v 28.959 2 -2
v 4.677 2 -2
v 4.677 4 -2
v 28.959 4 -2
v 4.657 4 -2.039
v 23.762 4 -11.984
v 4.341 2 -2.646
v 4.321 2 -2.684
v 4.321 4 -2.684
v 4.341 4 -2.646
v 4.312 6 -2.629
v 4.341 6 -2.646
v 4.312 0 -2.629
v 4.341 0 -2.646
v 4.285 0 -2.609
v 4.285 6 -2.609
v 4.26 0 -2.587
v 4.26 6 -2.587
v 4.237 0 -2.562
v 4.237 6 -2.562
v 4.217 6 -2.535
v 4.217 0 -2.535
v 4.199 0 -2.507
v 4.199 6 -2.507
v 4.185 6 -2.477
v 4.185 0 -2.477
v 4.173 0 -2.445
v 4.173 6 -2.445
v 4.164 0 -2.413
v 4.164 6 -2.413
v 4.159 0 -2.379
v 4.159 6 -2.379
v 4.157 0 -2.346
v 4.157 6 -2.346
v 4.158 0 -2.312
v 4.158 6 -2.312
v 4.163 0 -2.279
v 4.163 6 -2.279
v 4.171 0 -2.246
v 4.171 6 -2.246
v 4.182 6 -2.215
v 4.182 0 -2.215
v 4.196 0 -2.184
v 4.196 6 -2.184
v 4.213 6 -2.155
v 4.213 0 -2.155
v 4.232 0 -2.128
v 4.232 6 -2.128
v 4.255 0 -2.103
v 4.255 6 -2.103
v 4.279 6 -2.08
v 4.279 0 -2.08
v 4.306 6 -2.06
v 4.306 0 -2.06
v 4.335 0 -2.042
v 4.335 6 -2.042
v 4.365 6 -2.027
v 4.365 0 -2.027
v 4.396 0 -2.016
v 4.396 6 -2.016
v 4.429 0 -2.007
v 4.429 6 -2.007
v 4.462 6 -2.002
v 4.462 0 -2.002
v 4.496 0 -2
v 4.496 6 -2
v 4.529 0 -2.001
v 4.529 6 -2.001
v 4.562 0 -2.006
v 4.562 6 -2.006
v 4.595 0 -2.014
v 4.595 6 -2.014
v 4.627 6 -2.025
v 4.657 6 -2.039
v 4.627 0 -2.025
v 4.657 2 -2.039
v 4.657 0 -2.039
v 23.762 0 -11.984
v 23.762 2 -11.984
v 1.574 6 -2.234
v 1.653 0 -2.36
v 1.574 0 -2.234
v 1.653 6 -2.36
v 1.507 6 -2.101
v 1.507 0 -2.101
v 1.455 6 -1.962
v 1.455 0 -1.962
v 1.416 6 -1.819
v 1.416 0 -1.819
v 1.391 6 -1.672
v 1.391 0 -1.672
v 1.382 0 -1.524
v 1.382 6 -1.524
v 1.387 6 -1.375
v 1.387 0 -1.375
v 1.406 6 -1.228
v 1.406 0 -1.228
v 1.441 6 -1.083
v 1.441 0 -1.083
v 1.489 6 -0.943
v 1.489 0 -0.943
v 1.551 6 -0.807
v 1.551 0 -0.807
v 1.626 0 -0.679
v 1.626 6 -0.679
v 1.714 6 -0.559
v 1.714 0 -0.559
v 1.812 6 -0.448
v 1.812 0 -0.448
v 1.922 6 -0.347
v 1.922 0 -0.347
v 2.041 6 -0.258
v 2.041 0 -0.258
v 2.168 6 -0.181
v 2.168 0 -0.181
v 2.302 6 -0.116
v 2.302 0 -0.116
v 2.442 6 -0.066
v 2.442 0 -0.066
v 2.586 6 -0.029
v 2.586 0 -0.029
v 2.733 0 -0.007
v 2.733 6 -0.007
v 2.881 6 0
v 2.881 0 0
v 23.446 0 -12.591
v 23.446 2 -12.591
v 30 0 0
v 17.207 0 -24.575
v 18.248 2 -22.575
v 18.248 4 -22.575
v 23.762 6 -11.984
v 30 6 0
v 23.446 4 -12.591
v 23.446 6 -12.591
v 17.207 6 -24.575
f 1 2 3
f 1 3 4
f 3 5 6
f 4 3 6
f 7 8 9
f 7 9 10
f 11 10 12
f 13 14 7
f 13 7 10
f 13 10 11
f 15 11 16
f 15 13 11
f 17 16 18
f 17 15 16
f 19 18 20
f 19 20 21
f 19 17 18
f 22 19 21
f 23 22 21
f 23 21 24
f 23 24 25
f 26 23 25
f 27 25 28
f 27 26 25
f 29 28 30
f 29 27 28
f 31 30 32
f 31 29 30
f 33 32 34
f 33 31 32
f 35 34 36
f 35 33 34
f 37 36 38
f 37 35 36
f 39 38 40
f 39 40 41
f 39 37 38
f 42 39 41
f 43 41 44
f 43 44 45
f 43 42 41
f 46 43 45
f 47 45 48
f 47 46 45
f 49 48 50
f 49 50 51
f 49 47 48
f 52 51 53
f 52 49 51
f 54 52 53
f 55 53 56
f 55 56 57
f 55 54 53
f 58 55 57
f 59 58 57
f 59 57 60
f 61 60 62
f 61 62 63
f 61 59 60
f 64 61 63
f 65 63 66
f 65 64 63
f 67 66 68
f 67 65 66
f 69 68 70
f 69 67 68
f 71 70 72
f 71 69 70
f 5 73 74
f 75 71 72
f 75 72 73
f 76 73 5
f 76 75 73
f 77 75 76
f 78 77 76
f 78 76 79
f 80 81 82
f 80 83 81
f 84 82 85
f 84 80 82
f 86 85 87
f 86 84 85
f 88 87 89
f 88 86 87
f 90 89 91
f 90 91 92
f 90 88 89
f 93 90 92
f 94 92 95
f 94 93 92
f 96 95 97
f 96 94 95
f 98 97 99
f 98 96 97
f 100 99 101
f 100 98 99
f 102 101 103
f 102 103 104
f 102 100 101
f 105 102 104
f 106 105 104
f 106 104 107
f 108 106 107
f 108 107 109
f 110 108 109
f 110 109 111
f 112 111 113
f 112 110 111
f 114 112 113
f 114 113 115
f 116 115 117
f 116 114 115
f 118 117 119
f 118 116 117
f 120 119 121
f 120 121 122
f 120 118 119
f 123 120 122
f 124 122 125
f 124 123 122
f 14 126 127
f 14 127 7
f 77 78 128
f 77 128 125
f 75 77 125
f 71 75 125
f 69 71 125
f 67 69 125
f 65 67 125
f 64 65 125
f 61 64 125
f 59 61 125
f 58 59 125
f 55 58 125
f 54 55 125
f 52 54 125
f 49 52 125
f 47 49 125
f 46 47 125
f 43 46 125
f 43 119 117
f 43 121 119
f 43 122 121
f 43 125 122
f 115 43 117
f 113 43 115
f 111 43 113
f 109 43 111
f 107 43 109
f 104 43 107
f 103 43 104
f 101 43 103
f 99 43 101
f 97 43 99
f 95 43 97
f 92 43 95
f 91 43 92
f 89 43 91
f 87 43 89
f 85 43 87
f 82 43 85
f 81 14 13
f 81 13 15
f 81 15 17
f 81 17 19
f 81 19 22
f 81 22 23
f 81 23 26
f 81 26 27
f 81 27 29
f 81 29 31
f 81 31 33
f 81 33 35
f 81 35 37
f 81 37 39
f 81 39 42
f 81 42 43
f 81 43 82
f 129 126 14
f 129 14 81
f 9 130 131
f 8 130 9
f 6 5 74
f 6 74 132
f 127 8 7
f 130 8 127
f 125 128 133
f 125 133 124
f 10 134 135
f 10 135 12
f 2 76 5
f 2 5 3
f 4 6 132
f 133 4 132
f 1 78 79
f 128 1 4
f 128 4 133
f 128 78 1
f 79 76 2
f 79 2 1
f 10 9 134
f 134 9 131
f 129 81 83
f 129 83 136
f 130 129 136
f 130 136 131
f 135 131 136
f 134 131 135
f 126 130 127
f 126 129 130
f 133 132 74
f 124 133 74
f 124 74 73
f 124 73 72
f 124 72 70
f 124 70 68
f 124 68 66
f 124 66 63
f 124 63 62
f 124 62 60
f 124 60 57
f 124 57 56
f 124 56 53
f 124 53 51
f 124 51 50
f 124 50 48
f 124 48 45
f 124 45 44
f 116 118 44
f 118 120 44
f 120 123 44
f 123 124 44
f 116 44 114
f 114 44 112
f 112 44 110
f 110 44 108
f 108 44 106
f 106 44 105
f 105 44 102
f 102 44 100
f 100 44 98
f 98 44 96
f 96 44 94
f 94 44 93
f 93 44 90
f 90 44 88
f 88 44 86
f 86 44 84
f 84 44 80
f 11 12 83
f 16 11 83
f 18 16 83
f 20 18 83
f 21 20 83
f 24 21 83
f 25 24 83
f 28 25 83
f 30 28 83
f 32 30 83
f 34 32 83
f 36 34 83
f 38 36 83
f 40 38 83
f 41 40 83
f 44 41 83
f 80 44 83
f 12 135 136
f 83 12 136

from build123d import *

# Parameters (mm, degrees)
BOSS_EXTRUDE1_DEPTH = 6
SHELL1_START        = 2
SHELL1_DEPTH        = 2
FILLET1_R           = 1.5


# Read off the part's stored shape, not the designer's step: Shell1
with BuildPart() as part:
    # Sketch1 → Boss-Extrude1 (new body)
    with BuildSketch(Plane(origin=(0, 0, 0), x_dir=(1, 0, 0), z_dir=(0, 1, 0))):
        with BuildLine():
            Line((0, 0), (17.207293091, 24.574561329))
            Line((17.207293091, 24.574561329), (23.445639192, 12.590809966))
            Line((23.445639192, 12.590809966), (4.341304412, 2.645722757))
            ThreePointArc((4.341304412, 2.645722757), (4.195782463, 2.184186102), (4.657319118, 2.038664153))
            Line((4.657319118, 2.038664153), (23.761653899, 11.983751363))
            Line((23.761653899, 11.983751363), (30, 0))
            Line((30, 0), (0, 0))
        make_face()
    extrude(amount=BOSS_EXTRUDE1_DEPTH)

    # Shell1 outline → Shell1 (cut)
    with BuildSketch(Plane(origin=(0, 0, 0), x_dir=(1, 0, 0), z_dir=(0, 1, 0)).offset(SHELL1_START)):
        Polygon((4.321177127, 2.68438691), (4.341304412, 2.645722757), (23.445639192, 12.590809966), (18.248427192, 22.574561329), align=None)
        Polygon((23.761653899, 11.983751363), (4.657319118, 2.038664153), (4.677446402, 2), (28.958865899, 2), align=None)
    extrude(amount=SHELL1_DEPTH, mode=Mode.SUBTRACT)

    # Fillet1
    fillet1_edges = [part.edges().sort_by_distance(p)[0] for p in [
        (0, 3, 0),
    ]]
    fillet(fillet1_edges, radius=FILLET1_R)


solid = part.part
